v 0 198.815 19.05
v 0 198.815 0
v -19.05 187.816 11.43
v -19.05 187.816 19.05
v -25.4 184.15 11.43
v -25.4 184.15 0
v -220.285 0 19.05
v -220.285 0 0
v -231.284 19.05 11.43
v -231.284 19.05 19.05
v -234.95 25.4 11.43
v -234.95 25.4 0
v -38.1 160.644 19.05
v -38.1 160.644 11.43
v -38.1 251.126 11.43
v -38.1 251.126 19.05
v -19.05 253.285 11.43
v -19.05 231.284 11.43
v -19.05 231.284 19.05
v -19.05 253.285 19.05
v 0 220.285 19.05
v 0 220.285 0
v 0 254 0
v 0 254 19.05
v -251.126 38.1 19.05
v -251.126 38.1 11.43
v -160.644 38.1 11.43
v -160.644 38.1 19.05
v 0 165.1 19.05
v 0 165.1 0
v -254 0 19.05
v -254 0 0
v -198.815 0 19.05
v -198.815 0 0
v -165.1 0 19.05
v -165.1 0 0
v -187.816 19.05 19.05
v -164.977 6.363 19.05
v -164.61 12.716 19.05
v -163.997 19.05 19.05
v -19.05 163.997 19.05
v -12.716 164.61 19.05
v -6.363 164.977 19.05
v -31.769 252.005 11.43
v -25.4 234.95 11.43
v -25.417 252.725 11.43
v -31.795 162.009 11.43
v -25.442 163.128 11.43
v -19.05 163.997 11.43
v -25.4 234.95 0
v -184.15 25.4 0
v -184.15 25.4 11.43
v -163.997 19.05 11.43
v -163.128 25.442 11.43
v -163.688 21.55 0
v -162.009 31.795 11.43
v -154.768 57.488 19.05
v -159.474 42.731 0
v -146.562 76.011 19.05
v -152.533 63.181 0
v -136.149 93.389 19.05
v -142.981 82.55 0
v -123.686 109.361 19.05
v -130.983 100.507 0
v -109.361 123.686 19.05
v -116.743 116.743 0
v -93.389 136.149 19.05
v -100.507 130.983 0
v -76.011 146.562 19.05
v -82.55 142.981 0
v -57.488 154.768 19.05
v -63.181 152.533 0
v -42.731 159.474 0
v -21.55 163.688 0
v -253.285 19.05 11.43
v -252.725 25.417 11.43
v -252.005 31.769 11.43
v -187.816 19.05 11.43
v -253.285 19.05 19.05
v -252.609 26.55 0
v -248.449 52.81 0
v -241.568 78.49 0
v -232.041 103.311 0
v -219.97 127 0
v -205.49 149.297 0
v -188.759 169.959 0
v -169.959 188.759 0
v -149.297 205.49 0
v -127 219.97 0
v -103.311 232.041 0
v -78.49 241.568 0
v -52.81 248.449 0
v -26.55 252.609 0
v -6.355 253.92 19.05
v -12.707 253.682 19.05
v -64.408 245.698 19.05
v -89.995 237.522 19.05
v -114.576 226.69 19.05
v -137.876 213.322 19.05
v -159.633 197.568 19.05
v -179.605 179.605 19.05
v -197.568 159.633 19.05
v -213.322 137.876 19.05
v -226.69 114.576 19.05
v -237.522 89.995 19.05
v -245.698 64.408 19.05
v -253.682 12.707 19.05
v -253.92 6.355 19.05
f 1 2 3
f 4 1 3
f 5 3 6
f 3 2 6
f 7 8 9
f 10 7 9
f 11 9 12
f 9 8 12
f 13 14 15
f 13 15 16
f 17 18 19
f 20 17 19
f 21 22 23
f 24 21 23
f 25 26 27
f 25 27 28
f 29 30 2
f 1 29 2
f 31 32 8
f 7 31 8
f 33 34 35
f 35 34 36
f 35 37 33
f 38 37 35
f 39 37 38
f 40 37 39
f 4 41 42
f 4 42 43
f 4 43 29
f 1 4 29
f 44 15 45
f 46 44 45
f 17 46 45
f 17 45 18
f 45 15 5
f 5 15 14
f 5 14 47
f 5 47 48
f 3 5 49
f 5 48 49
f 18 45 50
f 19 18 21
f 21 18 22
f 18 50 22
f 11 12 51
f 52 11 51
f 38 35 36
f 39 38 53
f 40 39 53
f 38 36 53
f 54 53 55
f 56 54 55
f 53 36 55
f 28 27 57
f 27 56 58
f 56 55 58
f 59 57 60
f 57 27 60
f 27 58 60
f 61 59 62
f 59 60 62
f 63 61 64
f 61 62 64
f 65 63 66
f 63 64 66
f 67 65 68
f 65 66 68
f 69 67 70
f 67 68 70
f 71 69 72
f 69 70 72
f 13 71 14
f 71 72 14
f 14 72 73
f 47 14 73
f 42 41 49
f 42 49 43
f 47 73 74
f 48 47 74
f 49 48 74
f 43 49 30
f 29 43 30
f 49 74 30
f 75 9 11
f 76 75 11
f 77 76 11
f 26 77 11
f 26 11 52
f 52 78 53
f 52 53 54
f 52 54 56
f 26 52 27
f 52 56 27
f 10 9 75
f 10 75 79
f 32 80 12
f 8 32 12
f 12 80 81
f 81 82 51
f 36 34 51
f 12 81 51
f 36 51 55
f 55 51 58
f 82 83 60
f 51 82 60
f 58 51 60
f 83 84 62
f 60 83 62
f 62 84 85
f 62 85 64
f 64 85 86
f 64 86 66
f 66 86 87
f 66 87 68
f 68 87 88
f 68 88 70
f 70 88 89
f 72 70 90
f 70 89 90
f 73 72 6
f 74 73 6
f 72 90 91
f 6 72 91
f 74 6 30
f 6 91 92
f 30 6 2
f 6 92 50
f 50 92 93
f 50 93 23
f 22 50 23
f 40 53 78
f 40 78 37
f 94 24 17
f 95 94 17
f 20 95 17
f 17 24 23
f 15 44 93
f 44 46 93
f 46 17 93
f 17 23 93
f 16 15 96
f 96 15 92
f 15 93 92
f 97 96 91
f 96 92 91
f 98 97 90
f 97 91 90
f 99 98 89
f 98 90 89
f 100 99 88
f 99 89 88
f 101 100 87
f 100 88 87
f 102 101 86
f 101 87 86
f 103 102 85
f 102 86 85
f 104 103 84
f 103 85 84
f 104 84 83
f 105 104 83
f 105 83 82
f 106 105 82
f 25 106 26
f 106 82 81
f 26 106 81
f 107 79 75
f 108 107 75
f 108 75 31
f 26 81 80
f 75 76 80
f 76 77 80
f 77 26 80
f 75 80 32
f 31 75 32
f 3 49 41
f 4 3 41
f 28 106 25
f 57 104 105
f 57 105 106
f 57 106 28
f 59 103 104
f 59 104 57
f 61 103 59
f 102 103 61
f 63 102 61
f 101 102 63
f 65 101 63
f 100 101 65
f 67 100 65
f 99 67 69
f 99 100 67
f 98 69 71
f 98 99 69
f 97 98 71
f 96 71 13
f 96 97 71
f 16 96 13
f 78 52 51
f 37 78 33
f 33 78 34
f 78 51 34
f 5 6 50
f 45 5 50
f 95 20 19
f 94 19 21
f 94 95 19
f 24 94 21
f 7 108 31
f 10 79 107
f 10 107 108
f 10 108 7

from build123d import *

# Parameters (mm, degrees)
F1_DEPTH = 19.05
F2_W     = 19.05
F2_H     = 7.62
F3_DEPTH = 254.001
F4_W     = 19.05
F4_H     = 7.62
F5_DEPTH = 254.001


with BuildPart() as f1:
    # F0 (on Top) → F1 (new body)
    with BuildSketch(Plane.XY):
        with BuildLine():
            ThreePointArc((0, 254), (-179.605122, 179.605122), (-254, 0))
            Line((-254, 0), (-220.285303, 0))
            Line((-220.285303, 0), (-234.95, 25.4))
            Line((-234.95, 25.4), (-184.15, 25.4))
            Line((-184.15, 25.4), (-198.814697, 0))
            Line((-198.814697, 0), (-165.1, 0))
            ThreePointArc((-165.1, 0), (-116.74333, 116.74333), (0, 165.1))
            Line((0, 165.1), (0, 198.814697))
            Line((0, 198.814697), (-25.4, 184.15))
            Line((-25.4, 184.15), (-25.4, 234.95))
            Line((-25.4, 234.95), (0, 220.285303))
            Line((0, 220.285303), (0, 254))
        make_face()
    extrude(amount=F1_DEPTH)

    # F2 (on Right) → F3 (cut, through all)
    with BuildSketch(Plane.YZ):
        with Locations((28.575, 15.24)):
            Rectangle(F2_W, F2_H)
    extrude(amount=-F3_DEPTH, mode=Mode.SUBTRACT)

    # F4 (on Front) → F5 (cut, through all)
    with BuildSketch(Plane.XZ):
        with Locations((-28.575, 15.24)):
            Rectangle(F4_W, F4_H)
    extrude(amount=-F5_DEPTH, mode=Mode.SUBTRACT)


solid = f1.part
